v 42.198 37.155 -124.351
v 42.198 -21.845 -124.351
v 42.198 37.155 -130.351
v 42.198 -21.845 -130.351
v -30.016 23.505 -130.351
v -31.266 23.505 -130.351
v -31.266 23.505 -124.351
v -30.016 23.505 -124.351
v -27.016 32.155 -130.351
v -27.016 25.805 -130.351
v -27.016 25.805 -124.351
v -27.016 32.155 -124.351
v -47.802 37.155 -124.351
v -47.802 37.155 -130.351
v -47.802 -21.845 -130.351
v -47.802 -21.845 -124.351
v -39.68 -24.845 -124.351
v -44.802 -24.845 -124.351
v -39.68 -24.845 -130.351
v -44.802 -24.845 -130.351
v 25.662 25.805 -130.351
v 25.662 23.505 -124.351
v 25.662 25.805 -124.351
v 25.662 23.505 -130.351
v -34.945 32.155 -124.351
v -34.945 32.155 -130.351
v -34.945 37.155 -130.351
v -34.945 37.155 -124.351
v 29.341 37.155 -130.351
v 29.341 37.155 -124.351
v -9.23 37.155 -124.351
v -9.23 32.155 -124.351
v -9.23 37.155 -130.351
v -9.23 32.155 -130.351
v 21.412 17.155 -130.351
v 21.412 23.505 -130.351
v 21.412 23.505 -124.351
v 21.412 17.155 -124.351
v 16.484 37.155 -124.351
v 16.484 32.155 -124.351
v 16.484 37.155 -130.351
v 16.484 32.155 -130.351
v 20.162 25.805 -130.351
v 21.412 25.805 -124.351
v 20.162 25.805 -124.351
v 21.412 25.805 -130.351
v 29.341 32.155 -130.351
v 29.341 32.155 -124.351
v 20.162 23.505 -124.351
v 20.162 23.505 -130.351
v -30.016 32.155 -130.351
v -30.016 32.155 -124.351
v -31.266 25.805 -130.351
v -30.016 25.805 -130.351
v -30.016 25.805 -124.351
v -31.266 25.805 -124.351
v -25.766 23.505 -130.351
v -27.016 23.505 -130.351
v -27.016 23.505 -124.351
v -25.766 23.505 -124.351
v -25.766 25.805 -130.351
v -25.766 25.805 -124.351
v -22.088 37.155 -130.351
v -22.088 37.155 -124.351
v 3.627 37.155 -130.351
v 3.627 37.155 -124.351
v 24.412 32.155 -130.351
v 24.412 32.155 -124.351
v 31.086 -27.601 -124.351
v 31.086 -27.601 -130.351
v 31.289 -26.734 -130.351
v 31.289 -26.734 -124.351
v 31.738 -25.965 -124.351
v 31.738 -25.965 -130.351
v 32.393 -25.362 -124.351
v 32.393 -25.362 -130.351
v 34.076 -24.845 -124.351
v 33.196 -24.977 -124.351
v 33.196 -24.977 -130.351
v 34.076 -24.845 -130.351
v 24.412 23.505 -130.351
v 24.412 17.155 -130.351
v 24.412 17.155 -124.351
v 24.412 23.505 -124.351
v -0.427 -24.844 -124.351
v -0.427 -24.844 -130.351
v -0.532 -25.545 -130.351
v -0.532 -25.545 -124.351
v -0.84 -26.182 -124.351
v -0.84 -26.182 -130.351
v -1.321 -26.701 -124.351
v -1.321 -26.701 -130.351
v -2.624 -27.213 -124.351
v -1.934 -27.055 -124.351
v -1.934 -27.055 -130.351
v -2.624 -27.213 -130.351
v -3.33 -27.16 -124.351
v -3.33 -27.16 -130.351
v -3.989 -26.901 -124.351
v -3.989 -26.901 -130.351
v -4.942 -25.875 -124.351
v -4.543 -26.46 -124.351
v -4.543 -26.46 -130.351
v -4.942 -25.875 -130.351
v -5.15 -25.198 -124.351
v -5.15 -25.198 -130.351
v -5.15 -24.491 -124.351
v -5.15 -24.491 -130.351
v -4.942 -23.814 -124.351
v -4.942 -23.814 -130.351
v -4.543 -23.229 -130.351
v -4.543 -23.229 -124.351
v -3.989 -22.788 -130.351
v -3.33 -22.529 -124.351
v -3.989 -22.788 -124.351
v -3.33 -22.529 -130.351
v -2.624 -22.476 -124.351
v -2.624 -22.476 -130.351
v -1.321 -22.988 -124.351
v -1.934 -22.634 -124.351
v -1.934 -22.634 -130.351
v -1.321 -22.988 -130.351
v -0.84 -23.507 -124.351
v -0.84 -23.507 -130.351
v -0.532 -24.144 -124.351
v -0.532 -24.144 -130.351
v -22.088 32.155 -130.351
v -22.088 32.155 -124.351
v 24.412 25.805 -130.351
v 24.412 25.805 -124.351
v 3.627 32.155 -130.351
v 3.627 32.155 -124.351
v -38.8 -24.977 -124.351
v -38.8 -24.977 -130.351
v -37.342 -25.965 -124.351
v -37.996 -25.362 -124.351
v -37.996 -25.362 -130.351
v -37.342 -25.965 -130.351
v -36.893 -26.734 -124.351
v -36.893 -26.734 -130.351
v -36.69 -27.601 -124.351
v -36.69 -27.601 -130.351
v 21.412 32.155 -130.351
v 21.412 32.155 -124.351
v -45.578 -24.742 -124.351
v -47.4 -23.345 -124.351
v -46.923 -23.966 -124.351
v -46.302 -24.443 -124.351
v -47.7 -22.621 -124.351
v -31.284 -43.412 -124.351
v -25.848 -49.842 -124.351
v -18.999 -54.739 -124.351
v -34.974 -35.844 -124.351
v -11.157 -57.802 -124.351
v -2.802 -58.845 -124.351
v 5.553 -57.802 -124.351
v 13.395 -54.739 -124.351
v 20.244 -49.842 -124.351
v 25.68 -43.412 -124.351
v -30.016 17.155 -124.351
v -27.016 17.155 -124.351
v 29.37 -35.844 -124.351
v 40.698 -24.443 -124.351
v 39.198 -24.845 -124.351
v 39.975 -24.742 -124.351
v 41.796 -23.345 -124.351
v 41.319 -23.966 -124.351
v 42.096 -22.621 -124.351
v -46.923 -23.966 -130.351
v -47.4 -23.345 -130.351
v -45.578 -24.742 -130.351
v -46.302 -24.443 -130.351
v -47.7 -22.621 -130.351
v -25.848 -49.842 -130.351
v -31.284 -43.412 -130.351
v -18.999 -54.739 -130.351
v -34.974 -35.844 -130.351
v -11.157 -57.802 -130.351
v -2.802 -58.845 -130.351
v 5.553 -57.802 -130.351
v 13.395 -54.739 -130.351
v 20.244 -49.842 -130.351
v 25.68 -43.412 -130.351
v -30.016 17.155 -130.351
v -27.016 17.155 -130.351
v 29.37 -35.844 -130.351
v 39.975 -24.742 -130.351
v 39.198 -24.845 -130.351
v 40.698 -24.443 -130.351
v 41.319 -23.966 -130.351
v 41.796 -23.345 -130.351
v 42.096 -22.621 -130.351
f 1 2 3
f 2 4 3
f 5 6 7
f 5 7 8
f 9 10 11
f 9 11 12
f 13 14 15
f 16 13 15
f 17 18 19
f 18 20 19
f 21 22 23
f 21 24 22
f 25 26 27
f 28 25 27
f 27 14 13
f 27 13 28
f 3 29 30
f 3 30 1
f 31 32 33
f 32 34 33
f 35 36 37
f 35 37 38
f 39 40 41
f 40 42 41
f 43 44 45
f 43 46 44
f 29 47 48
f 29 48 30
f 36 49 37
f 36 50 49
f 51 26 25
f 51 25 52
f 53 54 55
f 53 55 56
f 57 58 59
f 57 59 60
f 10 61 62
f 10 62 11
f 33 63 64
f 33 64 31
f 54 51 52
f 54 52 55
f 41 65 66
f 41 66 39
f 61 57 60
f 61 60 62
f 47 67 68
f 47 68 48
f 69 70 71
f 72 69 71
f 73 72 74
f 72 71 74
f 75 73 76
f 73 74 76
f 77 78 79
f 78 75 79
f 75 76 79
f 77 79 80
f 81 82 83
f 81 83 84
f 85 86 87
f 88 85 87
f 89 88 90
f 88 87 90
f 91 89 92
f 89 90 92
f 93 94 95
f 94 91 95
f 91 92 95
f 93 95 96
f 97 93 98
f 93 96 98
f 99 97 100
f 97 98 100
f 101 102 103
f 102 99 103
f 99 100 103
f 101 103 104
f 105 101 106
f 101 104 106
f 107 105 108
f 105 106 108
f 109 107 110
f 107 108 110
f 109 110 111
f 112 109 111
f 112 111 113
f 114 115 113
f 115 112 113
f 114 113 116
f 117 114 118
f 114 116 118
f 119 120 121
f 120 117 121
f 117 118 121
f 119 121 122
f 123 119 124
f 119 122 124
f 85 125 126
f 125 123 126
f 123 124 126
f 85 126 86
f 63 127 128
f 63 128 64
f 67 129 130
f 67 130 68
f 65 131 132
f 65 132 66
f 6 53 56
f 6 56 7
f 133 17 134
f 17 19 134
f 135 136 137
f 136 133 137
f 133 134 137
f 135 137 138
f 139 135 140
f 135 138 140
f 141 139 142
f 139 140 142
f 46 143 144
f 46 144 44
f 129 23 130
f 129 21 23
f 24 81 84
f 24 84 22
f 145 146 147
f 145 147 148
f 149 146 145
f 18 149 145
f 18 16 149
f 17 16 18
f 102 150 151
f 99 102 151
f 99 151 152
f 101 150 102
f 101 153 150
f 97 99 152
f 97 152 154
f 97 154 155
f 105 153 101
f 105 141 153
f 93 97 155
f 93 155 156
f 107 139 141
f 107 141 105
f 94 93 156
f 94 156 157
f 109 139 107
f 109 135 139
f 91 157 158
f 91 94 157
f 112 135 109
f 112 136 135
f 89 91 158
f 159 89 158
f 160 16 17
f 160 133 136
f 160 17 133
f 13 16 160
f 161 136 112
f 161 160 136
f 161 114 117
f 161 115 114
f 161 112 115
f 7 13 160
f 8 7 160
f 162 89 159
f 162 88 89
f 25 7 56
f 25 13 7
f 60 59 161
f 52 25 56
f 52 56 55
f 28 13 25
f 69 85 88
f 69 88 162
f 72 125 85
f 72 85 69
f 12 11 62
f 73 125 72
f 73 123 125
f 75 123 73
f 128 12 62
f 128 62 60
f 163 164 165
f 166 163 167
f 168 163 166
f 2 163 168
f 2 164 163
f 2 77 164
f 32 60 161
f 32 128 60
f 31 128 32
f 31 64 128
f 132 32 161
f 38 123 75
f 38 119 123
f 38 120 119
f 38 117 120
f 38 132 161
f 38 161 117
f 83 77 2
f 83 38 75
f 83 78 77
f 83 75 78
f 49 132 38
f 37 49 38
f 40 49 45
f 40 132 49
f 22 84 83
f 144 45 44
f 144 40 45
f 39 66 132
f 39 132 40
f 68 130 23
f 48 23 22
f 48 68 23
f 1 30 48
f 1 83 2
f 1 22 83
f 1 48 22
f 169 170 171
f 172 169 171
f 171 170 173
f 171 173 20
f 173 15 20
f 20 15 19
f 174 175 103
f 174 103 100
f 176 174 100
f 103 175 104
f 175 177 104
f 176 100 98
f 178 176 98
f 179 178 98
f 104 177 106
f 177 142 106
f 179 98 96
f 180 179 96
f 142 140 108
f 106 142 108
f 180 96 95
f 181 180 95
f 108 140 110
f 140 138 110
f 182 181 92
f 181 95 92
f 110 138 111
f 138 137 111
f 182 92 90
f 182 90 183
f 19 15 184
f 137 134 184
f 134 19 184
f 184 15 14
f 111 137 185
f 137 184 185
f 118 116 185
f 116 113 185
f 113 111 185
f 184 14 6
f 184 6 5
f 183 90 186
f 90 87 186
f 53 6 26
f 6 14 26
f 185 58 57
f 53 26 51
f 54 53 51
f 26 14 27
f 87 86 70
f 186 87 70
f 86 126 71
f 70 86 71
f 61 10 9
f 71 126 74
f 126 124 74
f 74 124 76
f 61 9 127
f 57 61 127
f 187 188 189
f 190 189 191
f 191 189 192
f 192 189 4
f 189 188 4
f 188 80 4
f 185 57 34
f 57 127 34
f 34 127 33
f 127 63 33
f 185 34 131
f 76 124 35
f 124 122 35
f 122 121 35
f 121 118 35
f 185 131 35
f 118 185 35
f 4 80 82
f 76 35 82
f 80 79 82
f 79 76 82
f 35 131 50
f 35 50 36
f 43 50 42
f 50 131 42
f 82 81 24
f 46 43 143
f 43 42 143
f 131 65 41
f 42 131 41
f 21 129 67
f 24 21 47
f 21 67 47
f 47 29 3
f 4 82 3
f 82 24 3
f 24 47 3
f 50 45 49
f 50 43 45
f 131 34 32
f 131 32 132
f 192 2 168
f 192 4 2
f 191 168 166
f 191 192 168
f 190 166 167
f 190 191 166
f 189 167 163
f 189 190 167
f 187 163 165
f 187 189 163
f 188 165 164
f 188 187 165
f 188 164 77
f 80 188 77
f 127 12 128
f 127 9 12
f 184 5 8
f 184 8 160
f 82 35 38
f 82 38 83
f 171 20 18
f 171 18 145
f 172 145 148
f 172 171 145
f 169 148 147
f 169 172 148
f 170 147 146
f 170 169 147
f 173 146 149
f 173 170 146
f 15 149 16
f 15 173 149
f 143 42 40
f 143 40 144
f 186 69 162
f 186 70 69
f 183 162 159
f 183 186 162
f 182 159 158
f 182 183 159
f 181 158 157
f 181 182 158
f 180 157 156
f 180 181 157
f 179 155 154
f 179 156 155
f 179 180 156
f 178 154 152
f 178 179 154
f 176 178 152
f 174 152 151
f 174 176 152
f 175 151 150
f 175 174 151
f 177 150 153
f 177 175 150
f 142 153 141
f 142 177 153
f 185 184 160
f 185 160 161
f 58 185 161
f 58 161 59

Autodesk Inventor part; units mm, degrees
ref_plane "YZ Plane" through (0, 0, 0) normal (1, 0, 0) x (0, 1, 0)
ref_plane "XZ Plane" through (0, 0, 0) normal (0, 1, 0) x (-1, 0, 0)
ref_plane "РабПлоскость1" through (-34.9448, 28.465, -130.3508) normal (0, 0, 1) x (1, 0, 0)
ref_plane "РабПлоскость2" through (-162.802, 331.465, 111.3492) normal (0, 0, 1) x (1, 0, 0)
sketch "Эскиз1" plane through (-34.9448, 28.465, -130.3508) normal (0, 0, 1) x (1, 0, 0)
  line L0 (0, 3.6904) -> (-12.8571, 3.6904) construction
  line L1 (0, 3.6904) -> (0, 9.6905) projected
  line L2 (-12.8571, 9.6905) -> (0, 9.6905) projected
  line L3 (-12.8571, 3.6904) -> (-12.8571, 9.6905) projected
  line L4 (25.7143, 3.6904) -> (12.8571, 3.6904) construction
  line L5 (25.7143, 3.6904) -> (25.7143, 9.6905) projected
  line L6 (12.8571, 9.6905) -> (25.7143, 9.6905) projected
  line L7 (12.8571, 3.6904) -> (12.8571, 9.6905) projected
  line L8 (51.4286, 3.6904) -> (38.5714, 3.6904) construction
  line L9 (51.4286, 3.6904) -> (51.4286, 9.6905) projected
  line L10 (38.5714, 9.6905) -> (51.4286, 9.6905) projected
  line L11 (38.5714, 3.6904) -> (38.5714, 9.6905) projected
  line L12 (77.1429, 3.6904) -> (64.2857, 3.6904) construction
  line L13 (77.1429, 3.6904) -> (77.1429, 9.6905) projected
  line L14 (64.2857, 9.6905) -> (77.1429, 9.6905) projected
  line L15 (64.2857, 3.6904) -> (64.2857, 9.6905) projected
  line L16 (0, 3.6904) -> (12.8571, 3.6904)
  line L17 (25.7143, 3.6904) -> (38.5714, 3.6904)
  line L18 (51.4286, 3.6904) -> (64.2857, 3.6904)
  line L19 (-12.8571, 3.6904) -> (-12.8571, -50.3096)
  line L20 (-9.8571, -53.3096) -> (-4.7353, -53.3096)
  line L21 (77.1429, 3.6904) -> (77.1429, -50.3096)
  line L22 (74.1429, -53.3096) -> (69.021, -53.3096)
  line L23 (-1.8571, -53.3096) -> (66.1429, -53.3096) construction
  arc A0 (-1.7452, -56.0663) -> (66.0309, -56.0663) centre (32.1429, -53.3096) ccw
  arc A1 (-1.7452, -56.0663) -> (-4.7353, -53.3096) centre (-4.7353, -56.3096) ccw
  arc A2 (69.021, -53.3096) -> (66.0309, -56.0663) centre (69.021, -56.3096) ccw
  arc A3 (74.1429, -53.3096) -> (77.1429, -50.3096) centre (74.1429, -50.3096) ccw
  arc A4 (-12.8571, -50.3096) -> (-9.8571, -53.3096) centre (-9.8571, -50.3096) ccw
  circle A5 centre (32.1429, -53.3095) radius 2.375
  point P0 (34.9448, -28.465)
  point P1 (77.1429, -53.3096)
  dimension "d0" = 57
  dimension "d1" = 34
  dimension "d2" = 3
  dimension "d3" = 6
  dimension "d14" = 4.75
extrude "Выдавливание1" add sketch "Эскиз1" along normal blind 6
sketch "Эскиз2" plane through (-34.9448, 28.465, -130.3508) normal (0, 0, -1) x (-1, 0, 0)
  line L0 (-4.9286, 3.6904) -> (-4.9286, -2.6596)
  line L1 (-4.9286, -2.6596) -> (-3.6786, -2.6596)
  line L2 (-3.6786, -2.6596) -> (-3.6786, -4.9596)
  line L3 (-3.6786, -4.9596) -> (-4.9286, -4.9596)
  line L4 (-4.9286, -4.9596) -> (-4.9286, -11.3096)
  line L5 (-4.9286, -11.3096) -> (-7.9286, -11.3096)
  line L6 (-7.9286, -11.3096) -> (-7.9286, -4.9596)
  line L7 (-7.9286, -4.9596) -> (-9.1786, -4.9596)
  line L8 (-9.1786, -4.9596) -> (-9.1786, -2.6596)
  line L9 (-9.1786, -2.6596) -> (-7.9286, -2.6596)
  line L10 (-7.9286, -2.6596) -> (-7.9286, 3.6904)
  line L11 (-56.3571, 3.6904) -> (-59.3571, 3.6904)
  line L12 (-56.3571, 3.6904) -> (-56.3571, -2.6596)
  line L13 (-56.3571, -2.6596) -> (-55.1071, -2.6596)
  line L14 (-55.1071, -2.6596) -> (-55.1071, -4.9596)
  line L15 (-55.1071, -4.9596) -> (-56.3571, -4.9596)
  line L16 (-56.3571, -4.9596) -> (-56.3571, -11.3096)
  line L17 (-56.3571, -11.3096) -> (-59.3571, -11.3096)
  line L18 (-59.3571, -11.3096) -> (-59.3571, -4.9596)
  line L19 (-59.3571, -4.9596) -> (-60.6071, -4.9596)
  line L20 (-60.6071, -4.9596) -> (-60.6071, -2.6596)
  line L21 (-60.6071, -2.6596) -> (-59.3571, -2.6596)
  line L22 (-59.3571, -2.6596) -> (-59.3571, 3.6904)
  line L23 (-56.3571, 3.6904) -> (-59.3571, 3.6904) projected
  line L24 (-4.9286, 3.6904) -> (-7.9286, 3.6904) projected
  point P0 (-34.9448, -28.465)
  point P1 (-6.4286, 0)
  dimension "d9" = 5.5
  dimension "d10" = 2.3
  dimension "d11" = 15
extrude "Выдавливание2" cut sketch "Эскиз2" against normal blind 6
sketch "Эскиз4" plane through (29.3409, 38.1554, -130.3508) normal (0, 1, 0) x (1, 0, 0)
  line L0 (-77.1429, 0) -> (-77.1429, -6) projected
  line L1 (12.8571, 0) -> (-77.1429, 0)
  line L2 (-77.1429, 0) -> (-77.1429, -6)
  line L3 (-77.1429, -6) -> (12.8571, -6)
  line L4 (12.8571, -6) -> (12.8571, 0)
  point P0 (-29.3409, -130.3508)
extrude "Выдавливание3" cut sketch "Эскиз4" against normal blind 1
equation "\"d4\" = d3"
equation "\"d12\" = d3"
properties part number "wheel1"
